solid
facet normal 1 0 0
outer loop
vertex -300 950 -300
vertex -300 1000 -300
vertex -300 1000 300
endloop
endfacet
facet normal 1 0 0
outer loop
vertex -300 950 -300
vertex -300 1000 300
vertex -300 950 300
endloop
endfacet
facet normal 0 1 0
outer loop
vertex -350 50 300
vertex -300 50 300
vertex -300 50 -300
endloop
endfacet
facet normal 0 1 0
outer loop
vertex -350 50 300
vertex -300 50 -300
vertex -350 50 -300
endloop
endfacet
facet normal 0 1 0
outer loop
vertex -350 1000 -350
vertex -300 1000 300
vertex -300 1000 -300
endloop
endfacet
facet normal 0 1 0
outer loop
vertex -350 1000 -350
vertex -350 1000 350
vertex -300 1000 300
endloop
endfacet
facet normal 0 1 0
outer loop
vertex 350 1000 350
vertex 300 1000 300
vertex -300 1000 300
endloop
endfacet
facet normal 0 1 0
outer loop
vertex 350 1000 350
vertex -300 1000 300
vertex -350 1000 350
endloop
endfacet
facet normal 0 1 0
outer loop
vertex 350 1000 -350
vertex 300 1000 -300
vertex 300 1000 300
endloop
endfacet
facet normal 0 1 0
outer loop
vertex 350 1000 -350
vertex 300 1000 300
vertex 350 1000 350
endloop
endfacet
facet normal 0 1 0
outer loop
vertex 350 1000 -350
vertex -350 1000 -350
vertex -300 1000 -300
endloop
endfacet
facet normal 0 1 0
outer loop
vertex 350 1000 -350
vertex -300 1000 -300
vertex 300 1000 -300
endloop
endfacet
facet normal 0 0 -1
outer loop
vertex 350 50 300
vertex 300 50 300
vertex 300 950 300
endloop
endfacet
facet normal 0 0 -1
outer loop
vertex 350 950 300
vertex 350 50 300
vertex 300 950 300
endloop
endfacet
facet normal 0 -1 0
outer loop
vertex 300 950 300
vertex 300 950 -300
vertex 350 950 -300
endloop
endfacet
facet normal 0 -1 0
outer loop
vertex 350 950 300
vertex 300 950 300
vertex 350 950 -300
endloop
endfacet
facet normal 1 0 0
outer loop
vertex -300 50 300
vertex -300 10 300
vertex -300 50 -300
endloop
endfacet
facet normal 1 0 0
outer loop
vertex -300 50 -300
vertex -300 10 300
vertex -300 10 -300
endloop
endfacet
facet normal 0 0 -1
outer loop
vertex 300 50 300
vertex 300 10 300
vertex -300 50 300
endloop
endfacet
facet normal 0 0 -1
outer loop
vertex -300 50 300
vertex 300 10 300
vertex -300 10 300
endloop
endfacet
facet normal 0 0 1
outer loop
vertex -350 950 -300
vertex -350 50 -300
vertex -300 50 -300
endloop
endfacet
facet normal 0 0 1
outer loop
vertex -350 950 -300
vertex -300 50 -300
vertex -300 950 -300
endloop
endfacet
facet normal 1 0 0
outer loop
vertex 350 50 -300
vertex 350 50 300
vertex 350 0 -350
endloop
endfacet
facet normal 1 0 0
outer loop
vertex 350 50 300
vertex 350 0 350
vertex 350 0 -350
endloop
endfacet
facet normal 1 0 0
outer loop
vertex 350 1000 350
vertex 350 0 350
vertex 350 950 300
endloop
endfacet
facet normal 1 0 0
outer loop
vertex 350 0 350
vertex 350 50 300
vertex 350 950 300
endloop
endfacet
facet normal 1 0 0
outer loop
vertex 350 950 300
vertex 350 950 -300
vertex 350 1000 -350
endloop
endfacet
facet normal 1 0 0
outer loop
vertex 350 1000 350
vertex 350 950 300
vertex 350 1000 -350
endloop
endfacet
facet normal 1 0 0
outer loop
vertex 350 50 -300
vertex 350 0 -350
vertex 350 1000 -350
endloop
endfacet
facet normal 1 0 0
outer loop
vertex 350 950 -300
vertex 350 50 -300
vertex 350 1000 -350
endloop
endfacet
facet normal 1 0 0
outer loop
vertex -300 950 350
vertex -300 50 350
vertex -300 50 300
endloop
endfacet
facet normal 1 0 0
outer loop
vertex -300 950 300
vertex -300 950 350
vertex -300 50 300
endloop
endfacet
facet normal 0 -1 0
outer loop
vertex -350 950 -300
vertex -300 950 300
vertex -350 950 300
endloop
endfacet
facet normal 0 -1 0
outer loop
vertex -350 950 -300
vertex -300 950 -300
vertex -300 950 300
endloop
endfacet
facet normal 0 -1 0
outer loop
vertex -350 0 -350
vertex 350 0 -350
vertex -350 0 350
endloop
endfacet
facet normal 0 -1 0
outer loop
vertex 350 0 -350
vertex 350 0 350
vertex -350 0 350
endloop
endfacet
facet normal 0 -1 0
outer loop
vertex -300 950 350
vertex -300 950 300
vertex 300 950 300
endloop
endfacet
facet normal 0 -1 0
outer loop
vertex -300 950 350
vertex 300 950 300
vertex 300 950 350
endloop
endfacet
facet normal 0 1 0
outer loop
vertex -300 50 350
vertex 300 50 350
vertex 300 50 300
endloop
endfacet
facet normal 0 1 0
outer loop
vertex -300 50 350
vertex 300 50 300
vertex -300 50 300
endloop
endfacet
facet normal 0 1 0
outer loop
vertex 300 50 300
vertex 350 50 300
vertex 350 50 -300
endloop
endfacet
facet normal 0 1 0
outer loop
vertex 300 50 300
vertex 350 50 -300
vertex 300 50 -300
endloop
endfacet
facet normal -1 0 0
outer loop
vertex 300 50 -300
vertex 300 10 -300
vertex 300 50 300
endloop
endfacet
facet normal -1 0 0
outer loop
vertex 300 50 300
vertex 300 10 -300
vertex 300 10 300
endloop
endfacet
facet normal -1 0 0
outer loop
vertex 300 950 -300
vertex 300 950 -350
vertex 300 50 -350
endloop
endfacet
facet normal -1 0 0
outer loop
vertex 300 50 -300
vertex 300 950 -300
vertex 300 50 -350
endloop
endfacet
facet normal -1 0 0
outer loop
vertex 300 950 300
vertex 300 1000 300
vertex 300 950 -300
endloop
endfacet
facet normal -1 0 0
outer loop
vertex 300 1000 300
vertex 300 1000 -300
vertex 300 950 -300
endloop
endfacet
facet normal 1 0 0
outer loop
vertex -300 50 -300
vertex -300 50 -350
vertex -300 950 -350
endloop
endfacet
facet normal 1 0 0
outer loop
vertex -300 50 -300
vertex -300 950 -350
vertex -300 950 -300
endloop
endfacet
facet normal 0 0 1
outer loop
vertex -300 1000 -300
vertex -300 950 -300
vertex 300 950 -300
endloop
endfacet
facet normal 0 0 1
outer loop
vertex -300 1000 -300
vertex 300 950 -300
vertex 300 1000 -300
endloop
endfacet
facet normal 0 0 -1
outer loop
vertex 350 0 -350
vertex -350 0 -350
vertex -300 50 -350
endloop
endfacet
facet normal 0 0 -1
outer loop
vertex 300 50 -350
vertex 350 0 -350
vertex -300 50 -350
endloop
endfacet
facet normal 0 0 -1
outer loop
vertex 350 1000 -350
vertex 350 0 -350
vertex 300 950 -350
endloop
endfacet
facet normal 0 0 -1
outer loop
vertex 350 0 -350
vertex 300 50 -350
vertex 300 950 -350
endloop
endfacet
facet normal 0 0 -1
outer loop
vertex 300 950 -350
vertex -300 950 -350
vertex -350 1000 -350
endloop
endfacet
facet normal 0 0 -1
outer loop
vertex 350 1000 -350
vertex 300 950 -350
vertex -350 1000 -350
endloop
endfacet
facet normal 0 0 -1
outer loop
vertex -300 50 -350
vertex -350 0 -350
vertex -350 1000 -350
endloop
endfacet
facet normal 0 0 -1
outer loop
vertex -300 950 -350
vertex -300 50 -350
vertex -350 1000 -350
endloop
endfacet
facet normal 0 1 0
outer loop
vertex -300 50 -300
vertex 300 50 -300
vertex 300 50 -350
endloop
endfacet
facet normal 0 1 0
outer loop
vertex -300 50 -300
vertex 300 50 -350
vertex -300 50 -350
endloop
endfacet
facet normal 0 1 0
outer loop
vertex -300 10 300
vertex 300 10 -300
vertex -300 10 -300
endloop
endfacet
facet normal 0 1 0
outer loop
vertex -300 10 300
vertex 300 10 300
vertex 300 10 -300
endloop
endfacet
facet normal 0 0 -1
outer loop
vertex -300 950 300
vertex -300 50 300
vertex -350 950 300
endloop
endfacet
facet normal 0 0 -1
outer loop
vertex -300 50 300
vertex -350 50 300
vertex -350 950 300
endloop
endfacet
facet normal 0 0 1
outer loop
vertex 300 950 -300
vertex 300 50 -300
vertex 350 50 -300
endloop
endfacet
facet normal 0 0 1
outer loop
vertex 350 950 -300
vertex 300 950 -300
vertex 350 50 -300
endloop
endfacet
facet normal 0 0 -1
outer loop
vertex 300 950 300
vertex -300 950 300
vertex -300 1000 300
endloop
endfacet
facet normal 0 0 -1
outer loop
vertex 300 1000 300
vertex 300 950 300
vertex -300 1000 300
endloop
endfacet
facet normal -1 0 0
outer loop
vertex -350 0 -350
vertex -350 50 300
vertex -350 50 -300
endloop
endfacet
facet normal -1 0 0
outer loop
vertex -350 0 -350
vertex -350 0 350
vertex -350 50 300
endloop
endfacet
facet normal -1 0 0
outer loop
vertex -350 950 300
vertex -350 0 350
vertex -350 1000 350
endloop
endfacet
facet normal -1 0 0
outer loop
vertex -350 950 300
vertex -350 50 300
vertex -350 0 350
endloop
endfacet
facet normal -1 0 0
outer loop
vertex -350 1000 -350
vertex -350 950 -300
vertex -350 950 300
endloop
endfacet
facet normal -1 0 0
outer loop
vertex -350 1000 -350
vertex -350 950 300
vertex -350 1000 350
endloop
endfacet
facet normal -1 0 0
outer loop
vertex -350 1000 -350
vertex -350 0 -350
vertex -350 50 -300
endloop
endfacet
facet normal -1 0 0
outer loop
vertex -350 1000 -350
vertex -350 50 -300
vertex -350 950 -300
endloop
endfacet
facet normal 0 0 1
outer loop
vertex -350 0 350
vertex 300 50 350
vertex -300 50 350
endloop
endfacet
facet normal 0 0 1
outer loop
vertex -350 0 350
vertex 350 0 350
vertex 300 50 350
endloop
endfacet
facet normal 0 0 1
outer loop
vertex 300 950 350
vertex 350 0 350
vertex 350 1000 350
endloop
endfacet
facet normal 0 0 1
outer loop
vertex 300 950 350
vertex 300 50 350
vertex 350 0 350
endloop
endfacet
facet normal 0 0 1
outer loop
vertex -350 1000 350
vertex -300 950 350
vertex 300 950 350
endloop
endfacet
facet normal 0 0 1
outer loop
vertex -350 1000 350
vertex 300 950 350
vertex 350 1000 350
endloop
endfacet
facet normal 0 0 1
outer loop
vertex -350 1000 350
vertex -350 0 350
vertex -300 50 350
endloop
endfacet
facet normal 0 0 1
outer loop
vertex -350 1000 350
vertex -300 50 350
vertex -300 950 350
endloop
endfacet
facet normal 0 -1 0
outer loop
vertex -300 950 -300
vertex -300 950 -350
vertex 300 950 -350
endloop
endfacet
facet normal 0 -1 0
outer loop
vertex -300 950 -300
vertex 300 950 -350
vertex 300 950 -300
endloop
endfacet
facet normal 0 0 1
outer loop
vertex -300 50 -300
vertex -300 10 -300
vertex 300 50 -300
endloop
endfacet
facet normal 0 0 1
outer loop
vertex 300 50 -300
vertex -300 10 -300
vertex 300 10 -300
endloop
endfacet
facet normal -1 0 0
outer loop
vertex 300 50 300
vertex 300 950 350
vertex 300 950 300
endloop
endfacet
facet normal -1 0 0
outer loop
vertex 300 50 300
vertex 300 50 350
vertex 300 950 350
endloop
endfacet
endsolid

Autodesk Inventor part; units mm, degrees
ref_plane "YZ Plane" through (0, 0, 0) normal (1, 0, 0) x (0, 1, 0)
ref_plane "XZ Plane" through (0, 0, 0) normal (0, 1, 0) x (-1, 0, 0)
ref_plane "XY Plane" through (0, 0, 0) normal (0, 0, 1) x (1, 0, 0)
sketch "Sketch1" plane through (0, 0, 0) normal (0, 0, 1) x (1, 0, 0)
  point P0 (0, 0)
sketch "Sketch2" plane through (0, 0, 0) normal (0, 1, 0) x (-1, 0, 0)
  line L0 (-300, 300) -> (300, 300)
  line L1 (300, 300) -> (300, -300)
  line L2 (300, -300) -> (-300, -300)
  line L3 (-300, -300) -> (-300, 300)
  line L4 (-300, 300) -> (300, -300) construction
  line L5 (300, 300) -> (-300, -300) construction
  line L6 (350, 350) -> (-350, 350)
  line L7 (-350, 350) -> (-350, -350)
  line L8 (-350, -350) -> (350, -350)
  line L9 (350, -350) -> (350, 350)
  line L10 (350, 350) -> (-350, -350) construction
  line L11 (-350, 350) -> (350, -350) construction
  line L12 (-300, 300) -> (-350, 300)
  line L13 (-350, 300) -> (-350, 350)
  line L14 (-350, 350) -> (-300, 350)
  line L15 (-300, 350) -> (-300, 300)
  line L16 (300, 300) -> (350, 300)
  line L17 (350, 300) -> (350, 350)
  line L18 (350, 350) -> (300, 350)
  line L19 (300, 350) -> (300, 300)
  line L20 (350, -350) -> (300, -350)
  line L21 (300, -350) -> (300, -300)
  line L22 (300, -300) -> (350, -300)
  line L23 (350, -300) -> (350, -350)
  line L24 (-350, -350) -> (-300, -350)
  line L25 (-300, -350) -> (-300, -300)
  line L26 (-300, -300) -> (-350, -300)
  line L27 (-350, -300) -> (-350, -350)
  point P0 (0, 0)
  dimension "d0" = 600
  dimension "d1" = 600
  dimension "d2" = 700
  dimension "d3" = 700
extrude "Extrusion1" add sketch "Sketch2" along normal blind 10 contours L0 L1 L2 L3
extrude "Extrusion2" add sketch "Sketch2" along normal blind 50 contours L15 L6 L19 L0 | L3 L26 L7 L12 | L12 L7 L6 L15 | L16 L9 L22 L1 | L19 L6 L9 L16 | L2 L21 L8 L25 | L25 L8 L7 L26 | L22 L9 L8 L21
extrude "Extrusion3" add sketch "Sketch2" along normal blind 1000 contours L12 L7 L6 L15 | L19 L6 L9 L16 | L25 L8 L7 L26 | L22 L9 L8 L21
sketch3d "3D Sketch1"
sketch "Sketch3" plane through (-300, 50, 300) normal (1, 0, 0) x (0, 0, -1)
  line L0 (-50, -50) -> (-50, 950) projected
  line L1 (0, 0) -> (0, 950) projected
  line L2 (-50, 950) -> (0, 950)
  line L3 (0, 950) -> (0, 900)
  line L4 (0, 900) -> (-50, 900)
  line L5 (-50, 900) -> (-50, 950)
  point P0 (300, -50)
  dimension "d13" = 50
sketch "Sketch4" plane through (-300, 50, 300) normal (1, 0, 0) x (0, 0, -1)
  point P0 (300, -50)
extrude "Extrusion4" add sketch "Sketch3" along normal up to surface (600 mm away)
sketch "Sketch5" plane through (300, 50, -300) normal (0, 0, 1) x (1, 0, 0)
  line L0 (50, 950) -> (-650, 950) projected
  line L1 (0, 0) -> (0, 900) projected
  line L2 (50, 950) -> (0, 950)
  line L3 (0, 950) -> (0, 900)
  line L4 (0, 900) -> (50, 900)
  line L5 (50, 900) -> (50, 950)
  point P0 (-300, -50)
extrude "Extrusion5" add sketch "Sketch5" along normal up to surface (600 mm away)
sketch "Sketch6" plane through (-300, 50, -350) normal (1, 0, 0) x (0, 0, -1)
  line L0 (-50, 0) -> (-50, 950) projected
  line L1 (0, 0) -> (0, 950) projected
  line L2 (-50, 950) -> (0, 950)
  line L3 (0, 950) -> (0, 900)
  line L4 (0, 900) -> (-50, 900)
  line L5 (-50, 900) -> (-50, 950)
  point P0 (-350, -50)
  dimension "d18" = 50
extrude "Extrusion6" add sketch "Sketch6" along normal up to surface (600 mm away)
sketch "Sketch7" plane through (-350, 1000, -300) normal (0, 0, 1) x (1, 0, 0)
  line L0 (0, -950) -> (0, 0) projected
  line L1 (50, -950) -> (50, -50) projected
  line L2 (0, 0) -> (50, 0)
  line L3 (50, 0) -> (50, -50)
  line L4 (50, -50) -> (0, -50)
  line L5 (0, -50) -> (0, 0)
  point P0 (350, -1000)
extrude "Extrusion7" add sketch "Sketch7" along normal up to surface (600 mm away)
properties part number "Frame"
